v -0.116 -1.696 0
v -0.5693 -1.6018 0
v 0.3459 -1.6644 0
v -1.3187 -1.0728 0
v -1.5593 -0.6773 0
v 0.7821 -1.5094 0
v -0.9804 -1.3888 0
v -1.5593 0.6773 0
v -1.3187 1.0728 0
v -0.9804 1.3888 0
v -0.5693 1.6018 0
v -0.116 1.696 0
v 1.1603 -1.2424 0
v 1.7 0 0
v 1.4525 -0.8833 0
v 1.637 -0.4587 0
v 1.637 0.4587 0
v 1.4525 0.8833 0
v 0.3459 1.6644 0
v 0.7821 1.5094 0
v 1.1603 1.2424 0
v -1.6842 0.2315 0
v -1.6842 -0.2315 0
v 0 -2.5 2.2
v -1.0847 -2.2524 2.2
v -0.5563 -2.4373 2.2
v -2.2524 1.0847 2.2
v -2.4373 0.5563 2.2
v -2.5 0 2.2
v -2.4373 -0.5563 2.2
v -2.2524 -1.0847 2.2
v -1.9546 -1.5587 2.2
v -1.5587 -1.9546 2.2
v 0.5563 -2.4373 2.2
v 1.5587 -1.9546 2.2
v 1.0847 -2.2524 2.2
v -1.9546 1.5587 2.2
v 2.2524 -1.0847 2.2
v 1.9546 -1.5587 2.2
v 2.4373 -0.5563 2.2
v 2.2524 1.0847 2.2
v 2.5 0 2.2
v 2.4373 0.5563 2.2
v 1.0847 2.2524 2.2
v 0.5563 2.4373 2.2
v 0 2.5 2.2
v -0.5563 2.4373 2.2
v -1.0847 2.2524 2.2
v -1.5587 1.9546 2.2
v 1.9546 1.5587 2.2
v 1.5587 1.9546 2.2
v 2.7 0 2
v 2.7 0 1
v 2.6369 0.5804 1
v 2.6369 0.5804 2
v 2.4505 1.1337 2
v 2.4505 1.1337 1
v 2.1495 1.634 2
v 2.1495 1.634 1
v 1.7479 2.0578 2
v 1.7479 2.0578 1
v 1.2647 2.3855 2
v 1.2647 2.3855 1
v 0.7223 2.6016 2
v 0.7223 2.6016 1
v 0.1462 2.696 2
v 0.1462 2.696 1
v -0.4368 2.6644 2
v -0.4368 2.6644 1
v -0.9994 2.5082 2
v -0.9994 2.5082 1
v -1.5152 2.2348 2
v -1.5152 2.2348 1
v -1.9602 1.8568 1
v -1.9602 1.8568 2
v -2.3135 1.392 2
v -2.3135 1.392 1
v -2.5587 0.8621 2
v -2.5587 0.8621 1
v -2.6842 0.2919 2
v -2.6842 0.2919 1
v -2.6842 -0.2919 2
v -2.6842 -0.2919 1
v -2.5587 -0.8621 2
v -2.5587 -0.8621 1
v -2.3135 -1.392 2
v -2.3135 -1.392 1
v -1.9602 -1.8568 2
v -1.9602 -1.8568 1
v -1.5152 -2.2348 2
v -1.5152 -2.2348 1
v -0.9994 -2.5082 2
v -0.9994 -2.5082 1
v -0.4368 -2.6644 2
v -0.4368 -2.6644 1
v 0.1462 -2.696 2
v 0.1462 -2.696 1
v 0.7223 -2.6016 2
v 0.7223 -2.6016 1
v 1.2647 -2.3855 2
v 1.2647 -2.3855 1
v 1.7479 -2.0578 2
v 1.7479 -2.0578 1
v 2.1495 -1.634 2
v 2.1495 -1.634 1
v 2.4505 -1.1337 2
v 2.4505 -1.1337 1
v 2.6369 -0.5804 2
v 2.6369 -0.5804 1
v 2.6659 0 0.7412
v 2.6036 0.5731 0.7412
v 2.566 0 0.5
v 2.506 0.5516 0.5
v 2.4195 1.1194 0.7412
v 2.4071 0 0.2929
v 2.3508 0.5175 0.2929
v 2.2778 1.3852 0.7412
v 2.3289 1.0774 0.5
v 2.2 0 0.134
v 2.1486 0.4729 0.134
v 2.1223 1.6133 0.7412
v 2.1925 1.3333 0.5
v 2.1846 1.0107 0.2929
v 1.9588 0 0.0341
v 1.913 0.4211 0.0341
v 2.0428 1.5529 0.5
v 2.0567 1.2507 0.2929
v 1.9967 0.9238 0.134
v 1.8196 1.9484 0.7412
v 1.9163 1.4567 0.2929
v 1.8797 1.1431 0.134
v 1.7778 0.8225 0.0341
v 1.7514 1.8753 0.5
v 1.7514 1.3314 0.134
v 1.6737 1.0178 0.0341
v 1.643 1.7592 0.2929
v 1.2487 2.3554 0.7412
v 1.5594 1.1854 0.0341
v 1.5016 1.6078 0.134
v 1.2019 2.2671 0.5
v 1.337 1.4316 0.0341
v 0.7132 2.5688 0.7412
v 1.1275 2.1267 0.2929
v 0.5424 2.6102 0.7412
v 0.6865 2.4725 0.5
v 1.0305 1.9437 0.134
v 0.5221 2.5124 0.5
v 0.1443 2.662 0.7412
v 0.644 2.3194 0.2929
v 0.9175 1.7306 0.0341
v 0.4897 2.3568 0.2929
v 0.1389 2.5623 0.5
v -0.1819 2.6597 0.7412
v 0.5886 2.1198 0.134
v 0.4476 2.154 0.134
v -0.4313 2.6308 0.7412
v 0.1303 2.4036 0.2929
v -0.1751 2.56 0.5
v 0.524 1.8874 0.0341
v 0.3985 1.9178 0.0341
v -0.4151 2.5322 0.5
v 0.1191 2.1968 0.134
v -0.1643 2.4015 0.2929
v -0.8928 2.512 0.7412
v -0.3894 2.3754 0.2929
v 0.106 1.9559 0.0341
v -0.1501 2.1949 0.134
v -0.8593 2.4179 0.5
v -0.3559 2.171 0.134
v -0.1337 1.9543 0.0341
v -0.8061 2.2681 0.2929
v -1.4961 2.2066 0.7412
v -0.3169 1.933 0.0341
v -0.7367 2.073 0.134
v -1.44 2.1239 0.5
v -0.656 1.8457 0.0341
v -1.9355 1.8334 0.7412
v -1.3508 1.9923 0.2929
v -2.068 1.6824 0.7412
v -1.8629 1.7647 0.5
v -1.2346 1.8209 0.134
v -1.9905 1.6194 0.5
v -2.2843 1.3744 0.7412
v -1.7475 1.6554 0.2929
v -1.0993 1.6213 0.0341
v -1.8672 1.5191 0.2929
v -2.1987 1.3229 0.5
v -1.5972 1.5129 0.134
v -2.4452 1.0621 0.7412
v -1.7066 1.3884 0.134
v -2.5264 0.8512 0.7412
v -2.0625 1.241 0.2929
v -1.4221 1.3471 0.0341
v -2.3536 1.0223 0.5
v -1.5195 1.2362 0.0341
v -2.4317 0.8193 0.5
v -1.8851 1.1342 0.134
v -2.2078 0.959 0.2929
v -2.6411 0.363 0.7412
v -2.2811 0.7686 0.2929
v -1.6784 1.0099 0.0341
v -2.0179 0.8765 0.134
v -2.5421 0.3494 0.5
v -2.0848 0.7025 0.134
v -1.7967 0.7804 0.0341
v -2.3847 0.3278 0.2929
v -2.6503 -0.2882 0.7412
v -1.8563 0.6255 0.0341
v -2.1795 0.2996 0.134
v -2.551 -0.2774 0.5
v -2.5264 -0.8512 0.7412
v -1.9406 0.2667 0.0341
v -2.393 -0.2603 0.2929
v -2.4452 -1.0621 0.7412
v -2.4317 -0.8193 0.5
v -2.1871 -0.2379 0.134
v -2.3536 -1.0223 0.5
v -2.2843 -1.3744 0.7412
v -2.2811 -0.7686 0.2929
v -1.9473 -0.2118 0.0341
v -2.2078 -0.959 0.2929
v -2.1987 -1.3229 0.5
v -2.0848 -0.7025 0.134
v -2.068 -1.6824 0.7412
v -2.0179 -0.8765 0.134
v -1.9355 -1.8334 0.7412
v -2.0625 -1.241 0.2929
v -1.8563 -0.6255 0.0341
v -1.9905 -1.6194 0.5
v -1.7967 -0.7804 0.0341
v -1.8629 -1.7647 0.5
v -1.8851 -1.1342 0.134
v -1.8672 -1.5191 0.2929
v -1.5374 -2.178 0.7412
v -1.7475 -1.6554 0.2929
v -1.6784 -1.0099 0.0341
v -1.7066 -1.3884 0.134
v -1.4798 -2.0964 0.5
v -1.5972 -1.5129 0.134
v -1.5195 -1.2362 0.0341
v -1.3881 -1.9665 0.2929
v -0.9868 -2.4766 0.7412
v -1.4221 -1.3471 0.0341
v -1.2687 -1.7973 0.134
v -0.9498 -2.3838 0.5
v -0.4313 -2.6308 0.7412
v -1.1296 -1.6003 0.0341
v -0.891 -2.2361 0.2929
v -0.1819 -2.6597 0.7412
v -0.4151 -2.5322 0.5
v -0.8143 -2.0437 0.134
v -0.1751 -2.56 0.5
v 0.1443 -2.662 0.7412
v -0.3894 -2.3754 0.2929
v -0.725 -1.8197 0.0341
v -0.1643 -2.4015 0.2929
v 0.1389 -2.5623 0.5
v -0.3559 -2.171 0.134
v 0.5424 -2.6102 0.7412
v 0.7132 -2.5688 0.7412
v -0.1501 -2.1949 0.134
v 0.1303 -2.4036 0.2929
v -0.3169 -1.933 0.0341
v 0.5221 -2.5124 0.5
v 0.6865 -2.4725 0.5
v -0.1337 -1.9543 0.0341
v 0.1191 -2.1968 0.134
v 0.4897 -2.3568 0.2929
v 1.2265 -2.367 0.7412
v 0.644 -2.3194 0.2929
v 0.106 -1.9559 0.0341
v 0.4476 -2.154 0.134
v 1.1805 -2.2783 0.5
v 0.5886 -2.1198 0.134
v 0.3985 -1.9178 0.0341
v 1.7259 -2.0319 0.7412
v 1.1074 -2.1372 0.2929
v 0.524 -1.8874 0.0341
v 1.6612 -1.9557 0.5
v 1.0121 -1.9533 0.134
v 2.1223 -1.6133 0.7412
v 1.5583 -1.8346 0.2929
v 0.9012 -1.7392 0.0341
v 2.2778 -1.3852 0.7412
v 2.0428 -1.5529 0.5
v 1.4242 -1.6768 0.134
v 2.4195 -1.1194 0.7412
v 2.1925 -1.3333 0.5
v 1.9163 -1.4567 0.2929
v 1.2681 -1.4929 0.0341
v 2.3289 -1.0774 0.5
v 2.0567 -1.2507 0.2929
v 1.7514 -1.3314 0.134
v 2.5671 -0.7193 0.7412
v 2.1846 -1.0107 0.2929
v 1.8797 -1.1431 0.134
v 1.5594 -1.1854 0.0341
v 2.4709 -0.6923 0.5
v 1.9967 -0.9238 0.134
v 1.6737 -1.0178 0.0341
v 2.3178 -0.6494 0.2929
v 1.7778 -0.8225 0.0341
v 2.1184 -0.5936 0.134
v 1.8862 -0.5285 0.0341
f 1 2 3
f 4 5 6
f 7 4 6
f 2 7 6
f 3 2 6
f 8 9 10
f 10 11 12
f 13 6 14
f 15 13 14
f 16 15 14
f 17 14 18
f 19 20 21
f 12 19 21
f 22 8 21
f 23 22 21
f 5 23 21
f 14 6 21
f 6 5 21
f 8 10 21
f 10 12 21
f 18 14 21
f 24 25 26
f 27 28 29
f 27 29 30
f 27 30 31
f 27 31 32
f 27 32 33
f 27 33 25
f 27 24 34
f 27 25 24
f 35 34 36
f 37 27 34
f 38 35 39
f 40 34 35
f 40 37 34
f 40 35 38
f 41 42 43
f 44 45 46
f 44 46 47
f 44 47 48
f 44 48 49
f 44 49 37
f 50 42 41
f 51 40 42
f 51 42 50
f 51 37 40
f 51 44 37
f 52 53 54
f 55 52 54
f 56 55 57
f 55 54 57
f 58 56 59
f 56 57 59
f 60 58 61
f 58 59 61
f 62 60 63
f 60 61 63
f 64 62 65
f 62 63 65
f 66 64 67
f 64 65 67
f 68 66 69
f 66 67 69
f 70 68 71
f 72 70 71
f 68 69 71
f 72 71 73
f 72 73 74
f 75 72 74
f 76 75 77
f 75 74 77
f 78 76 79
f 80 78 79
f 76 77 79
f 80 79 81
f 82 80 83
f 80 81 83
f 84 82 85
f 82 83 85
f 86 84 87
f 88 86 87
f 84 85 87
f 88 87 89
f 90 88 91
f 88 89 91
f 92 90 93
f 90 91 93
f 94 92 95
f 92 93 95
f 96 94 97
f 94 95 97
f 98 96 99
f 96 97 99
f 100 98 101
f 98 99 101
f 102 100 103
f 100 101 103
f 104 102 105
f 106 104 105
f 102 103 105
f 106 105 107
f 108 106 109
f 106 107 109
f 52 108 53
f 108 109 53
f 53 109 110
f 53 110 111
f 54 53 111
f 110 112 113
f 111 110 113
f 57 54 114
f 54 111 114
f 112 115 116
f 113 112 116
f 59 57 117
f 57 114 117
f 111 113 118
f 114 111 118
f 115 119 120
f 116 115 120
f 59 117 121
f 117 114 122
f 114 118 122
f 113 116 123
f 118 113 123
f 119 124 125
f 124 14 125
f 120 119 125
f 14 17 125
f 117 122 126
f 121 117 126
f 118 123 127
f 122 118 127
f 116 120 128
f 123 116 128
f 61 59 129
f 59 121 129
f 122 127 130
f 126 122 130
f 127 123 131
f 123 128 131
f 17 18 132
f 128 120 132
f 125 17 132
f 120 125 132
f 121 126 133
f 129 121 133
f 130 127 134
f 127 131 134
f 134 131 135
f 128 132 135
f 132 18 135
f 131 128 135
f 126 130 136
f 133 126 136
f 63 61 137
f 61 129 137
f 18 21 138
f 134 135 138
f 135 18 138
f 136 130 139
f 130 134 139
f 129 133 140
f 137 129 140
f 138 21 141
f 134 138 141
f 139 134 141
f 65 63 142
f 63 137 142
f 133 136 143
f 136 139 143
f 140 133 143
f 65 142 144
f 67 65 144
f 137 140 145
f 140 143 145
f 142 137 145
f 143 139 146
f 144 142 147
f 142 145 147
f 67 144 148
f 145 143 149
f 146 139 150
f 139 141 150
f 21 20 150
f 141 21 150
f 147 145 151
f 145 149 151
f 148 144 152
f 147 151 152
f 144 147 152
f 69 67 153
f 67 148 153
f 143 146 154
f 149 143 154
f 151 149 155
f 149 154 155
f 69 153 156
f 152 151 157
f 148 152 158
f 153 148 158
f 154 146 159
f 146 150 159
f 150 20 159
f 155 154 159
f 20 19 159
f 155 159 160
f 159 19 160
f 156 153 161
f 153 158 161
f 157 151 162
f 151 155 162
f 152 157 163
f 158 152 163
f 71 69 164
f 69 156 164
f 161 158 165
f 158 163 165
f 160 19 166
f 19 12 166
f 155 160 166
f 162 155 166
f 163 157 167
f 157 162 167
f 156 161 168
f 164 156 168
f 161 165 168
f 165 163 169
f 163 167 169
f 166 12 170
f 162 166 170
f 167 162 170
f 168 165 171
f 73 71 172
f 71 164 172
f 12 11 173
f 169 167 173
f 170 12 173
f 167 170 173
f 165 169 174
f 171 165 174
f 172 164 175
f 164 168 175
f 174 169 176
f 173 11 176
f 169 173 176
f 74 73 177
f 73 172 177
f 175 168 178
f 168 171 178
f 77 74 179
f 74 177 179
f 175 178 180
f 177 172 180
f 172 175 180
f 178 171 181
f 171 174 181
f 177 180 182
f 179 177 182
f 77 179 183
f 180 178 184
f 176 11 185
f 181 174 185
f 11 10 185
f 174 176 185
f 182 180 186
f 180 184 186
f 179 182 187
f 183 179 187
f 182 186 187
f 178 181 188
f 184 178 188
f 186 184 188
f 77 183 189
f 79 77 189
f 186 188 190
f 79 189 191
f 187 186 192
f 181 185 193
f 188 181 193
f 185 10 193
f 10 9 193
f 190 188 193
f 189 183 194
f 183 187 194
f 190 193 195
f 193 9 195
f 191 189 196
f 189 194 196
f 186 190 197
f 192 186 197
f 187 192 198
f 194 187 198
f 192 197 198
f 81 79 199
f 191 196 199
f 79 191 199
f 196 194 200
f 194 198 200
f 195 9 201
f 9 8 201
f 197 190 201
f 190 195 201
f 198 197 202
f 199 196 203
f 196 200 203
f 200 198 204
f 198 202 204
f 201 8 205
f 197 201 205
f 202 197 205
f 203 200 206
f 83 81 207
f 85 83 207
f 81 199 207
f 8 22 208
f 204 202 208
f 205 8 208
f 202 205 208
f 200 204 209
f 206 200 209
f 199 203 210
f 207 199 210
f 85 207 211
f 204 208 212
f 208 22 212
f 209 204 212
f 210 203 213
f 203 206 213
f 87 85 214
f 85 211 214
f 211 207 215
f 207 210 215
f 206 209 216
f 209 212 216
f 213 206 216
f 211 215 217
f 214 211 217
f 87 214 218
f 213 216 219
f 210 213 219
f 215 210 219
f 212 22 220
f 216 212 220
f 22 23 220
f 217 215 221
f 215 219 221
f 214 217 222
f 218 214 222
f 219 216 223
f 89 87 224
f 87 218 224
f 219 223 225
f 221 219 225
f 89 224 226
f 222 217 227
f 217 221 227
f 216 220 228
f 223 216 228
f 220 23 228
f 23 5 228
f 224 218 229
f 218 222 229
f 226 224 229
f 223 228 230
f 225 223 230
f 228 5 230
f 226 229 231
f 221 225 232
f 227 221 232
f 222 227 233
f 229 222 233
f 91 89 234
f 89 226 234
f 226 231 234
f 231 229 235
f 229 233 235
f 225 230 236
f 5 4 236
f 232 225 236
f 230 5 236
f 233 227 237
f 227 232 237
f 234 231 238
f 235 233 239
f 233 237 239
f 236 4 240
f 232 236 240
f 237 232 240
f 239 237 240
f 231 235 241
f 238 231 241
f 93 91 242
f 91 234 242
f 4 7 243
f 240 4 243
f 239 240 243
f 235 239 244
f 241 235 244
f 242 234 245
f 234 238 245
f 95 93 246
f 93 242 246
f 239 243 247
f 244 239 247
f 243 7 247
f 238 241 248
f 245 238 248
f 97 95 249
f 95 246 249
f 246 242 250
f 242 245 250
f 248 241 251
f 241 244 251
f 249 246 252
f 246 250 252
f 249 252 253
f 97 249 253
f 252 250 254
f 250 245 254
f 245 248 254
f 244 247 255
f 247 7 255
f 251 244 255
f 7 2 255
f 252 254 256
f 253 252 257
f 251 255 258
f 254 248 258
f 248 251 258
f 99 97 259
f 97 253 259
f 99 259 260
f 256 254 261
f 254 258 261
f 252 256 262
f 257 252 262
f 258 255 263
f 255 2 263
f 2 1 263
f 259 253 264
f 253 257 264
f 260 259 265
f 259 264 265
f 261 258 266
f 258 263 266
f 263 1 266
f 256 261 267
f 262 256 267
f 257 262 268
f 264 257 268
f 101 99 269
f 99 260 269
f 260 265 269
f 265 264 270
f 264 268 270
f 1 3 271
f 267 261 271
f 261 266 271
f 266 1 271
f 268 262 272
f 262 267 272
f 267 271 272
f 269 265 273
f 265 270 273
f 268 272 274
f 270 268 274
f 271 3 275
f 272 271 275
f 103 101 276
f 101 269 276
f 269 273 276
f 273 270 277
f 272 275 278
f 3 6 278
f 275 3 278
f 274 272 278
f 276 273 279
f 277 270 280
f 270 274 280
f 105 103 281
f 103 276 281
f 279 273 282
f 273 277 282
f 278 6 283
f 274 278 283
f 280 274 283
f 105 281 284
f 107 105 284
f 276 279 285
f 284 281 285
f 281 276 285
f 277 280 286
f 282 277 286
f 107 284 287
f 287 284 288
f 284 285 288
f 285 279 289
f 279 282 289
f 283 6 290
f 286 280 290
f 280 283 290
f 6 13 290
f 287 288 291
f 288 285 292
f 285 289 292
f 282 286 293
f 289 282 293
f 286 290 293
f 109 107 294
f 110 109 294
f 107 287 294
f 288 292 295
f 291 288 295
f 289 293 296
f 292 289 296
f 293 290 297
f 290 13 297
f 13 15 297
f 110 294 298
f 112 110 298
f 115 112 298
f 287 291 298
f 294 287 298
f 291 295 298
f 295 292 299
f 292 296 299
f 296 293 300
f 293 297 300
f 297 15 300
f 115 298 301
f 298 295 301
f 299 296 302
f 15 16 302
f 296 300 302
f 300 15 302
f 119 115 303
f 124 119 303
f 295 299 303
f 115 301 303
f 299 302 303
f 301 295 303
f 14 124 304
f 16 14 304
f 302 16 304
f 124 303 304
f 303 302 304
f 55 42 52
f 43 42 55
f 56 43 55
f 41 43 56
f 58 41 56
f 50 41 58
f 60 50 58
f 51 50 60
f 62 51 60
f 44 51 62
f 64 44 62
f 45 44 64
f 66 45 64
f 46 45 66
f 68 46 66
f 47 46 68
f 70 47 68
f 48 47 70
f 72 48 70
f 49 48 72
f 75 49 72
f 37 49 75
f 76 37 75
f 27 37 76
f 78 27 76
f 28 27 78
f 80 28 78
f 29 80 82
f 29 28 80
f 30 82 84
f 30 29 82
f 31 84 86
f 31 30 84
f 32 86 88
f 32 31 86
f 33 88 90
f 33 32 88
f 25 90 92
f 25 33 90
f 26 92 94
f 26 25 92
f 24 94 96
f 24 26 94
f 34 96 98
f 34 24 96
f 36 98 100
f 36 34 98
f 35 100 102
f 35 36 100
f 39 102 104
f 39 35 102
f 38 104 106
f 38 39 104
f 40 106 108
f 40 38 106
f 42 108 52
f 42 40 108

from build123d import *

# Parameters (mm, degrees)
SKETCH_1_R      = 2.7
EXTRUDE_1_DEPTH = 2.2
FILLET_1_R      = 1
CHAMFER_1_SIZE  = 0.2


with BuildPart() as part:
    # 草图1 → 凸台-拉伸1 (new body)
    with BuildSketch(Plane.XY):
        Circle(SKETCH_1_R)
    extrude(amount=EXTRUDE_1_DEPTH)

    # 圆角1
    fillet_1_edges = [part.edges().sort_by_distance(p)[0] for p in [
        (-2.7, 0, 0),
    ]]
    fillet(fillet_1_edges, radius=FILLET_1_R)

    # 倒角1
    chamfer_1_edges = [part.edges().sort_by_distance(p)[0] for p in [
        (-2.7, 0, 2.2),
    ]]
    chamfer(chamfer_1_edges, length=CHAMFER_1_SIZE)


solid = part.part
